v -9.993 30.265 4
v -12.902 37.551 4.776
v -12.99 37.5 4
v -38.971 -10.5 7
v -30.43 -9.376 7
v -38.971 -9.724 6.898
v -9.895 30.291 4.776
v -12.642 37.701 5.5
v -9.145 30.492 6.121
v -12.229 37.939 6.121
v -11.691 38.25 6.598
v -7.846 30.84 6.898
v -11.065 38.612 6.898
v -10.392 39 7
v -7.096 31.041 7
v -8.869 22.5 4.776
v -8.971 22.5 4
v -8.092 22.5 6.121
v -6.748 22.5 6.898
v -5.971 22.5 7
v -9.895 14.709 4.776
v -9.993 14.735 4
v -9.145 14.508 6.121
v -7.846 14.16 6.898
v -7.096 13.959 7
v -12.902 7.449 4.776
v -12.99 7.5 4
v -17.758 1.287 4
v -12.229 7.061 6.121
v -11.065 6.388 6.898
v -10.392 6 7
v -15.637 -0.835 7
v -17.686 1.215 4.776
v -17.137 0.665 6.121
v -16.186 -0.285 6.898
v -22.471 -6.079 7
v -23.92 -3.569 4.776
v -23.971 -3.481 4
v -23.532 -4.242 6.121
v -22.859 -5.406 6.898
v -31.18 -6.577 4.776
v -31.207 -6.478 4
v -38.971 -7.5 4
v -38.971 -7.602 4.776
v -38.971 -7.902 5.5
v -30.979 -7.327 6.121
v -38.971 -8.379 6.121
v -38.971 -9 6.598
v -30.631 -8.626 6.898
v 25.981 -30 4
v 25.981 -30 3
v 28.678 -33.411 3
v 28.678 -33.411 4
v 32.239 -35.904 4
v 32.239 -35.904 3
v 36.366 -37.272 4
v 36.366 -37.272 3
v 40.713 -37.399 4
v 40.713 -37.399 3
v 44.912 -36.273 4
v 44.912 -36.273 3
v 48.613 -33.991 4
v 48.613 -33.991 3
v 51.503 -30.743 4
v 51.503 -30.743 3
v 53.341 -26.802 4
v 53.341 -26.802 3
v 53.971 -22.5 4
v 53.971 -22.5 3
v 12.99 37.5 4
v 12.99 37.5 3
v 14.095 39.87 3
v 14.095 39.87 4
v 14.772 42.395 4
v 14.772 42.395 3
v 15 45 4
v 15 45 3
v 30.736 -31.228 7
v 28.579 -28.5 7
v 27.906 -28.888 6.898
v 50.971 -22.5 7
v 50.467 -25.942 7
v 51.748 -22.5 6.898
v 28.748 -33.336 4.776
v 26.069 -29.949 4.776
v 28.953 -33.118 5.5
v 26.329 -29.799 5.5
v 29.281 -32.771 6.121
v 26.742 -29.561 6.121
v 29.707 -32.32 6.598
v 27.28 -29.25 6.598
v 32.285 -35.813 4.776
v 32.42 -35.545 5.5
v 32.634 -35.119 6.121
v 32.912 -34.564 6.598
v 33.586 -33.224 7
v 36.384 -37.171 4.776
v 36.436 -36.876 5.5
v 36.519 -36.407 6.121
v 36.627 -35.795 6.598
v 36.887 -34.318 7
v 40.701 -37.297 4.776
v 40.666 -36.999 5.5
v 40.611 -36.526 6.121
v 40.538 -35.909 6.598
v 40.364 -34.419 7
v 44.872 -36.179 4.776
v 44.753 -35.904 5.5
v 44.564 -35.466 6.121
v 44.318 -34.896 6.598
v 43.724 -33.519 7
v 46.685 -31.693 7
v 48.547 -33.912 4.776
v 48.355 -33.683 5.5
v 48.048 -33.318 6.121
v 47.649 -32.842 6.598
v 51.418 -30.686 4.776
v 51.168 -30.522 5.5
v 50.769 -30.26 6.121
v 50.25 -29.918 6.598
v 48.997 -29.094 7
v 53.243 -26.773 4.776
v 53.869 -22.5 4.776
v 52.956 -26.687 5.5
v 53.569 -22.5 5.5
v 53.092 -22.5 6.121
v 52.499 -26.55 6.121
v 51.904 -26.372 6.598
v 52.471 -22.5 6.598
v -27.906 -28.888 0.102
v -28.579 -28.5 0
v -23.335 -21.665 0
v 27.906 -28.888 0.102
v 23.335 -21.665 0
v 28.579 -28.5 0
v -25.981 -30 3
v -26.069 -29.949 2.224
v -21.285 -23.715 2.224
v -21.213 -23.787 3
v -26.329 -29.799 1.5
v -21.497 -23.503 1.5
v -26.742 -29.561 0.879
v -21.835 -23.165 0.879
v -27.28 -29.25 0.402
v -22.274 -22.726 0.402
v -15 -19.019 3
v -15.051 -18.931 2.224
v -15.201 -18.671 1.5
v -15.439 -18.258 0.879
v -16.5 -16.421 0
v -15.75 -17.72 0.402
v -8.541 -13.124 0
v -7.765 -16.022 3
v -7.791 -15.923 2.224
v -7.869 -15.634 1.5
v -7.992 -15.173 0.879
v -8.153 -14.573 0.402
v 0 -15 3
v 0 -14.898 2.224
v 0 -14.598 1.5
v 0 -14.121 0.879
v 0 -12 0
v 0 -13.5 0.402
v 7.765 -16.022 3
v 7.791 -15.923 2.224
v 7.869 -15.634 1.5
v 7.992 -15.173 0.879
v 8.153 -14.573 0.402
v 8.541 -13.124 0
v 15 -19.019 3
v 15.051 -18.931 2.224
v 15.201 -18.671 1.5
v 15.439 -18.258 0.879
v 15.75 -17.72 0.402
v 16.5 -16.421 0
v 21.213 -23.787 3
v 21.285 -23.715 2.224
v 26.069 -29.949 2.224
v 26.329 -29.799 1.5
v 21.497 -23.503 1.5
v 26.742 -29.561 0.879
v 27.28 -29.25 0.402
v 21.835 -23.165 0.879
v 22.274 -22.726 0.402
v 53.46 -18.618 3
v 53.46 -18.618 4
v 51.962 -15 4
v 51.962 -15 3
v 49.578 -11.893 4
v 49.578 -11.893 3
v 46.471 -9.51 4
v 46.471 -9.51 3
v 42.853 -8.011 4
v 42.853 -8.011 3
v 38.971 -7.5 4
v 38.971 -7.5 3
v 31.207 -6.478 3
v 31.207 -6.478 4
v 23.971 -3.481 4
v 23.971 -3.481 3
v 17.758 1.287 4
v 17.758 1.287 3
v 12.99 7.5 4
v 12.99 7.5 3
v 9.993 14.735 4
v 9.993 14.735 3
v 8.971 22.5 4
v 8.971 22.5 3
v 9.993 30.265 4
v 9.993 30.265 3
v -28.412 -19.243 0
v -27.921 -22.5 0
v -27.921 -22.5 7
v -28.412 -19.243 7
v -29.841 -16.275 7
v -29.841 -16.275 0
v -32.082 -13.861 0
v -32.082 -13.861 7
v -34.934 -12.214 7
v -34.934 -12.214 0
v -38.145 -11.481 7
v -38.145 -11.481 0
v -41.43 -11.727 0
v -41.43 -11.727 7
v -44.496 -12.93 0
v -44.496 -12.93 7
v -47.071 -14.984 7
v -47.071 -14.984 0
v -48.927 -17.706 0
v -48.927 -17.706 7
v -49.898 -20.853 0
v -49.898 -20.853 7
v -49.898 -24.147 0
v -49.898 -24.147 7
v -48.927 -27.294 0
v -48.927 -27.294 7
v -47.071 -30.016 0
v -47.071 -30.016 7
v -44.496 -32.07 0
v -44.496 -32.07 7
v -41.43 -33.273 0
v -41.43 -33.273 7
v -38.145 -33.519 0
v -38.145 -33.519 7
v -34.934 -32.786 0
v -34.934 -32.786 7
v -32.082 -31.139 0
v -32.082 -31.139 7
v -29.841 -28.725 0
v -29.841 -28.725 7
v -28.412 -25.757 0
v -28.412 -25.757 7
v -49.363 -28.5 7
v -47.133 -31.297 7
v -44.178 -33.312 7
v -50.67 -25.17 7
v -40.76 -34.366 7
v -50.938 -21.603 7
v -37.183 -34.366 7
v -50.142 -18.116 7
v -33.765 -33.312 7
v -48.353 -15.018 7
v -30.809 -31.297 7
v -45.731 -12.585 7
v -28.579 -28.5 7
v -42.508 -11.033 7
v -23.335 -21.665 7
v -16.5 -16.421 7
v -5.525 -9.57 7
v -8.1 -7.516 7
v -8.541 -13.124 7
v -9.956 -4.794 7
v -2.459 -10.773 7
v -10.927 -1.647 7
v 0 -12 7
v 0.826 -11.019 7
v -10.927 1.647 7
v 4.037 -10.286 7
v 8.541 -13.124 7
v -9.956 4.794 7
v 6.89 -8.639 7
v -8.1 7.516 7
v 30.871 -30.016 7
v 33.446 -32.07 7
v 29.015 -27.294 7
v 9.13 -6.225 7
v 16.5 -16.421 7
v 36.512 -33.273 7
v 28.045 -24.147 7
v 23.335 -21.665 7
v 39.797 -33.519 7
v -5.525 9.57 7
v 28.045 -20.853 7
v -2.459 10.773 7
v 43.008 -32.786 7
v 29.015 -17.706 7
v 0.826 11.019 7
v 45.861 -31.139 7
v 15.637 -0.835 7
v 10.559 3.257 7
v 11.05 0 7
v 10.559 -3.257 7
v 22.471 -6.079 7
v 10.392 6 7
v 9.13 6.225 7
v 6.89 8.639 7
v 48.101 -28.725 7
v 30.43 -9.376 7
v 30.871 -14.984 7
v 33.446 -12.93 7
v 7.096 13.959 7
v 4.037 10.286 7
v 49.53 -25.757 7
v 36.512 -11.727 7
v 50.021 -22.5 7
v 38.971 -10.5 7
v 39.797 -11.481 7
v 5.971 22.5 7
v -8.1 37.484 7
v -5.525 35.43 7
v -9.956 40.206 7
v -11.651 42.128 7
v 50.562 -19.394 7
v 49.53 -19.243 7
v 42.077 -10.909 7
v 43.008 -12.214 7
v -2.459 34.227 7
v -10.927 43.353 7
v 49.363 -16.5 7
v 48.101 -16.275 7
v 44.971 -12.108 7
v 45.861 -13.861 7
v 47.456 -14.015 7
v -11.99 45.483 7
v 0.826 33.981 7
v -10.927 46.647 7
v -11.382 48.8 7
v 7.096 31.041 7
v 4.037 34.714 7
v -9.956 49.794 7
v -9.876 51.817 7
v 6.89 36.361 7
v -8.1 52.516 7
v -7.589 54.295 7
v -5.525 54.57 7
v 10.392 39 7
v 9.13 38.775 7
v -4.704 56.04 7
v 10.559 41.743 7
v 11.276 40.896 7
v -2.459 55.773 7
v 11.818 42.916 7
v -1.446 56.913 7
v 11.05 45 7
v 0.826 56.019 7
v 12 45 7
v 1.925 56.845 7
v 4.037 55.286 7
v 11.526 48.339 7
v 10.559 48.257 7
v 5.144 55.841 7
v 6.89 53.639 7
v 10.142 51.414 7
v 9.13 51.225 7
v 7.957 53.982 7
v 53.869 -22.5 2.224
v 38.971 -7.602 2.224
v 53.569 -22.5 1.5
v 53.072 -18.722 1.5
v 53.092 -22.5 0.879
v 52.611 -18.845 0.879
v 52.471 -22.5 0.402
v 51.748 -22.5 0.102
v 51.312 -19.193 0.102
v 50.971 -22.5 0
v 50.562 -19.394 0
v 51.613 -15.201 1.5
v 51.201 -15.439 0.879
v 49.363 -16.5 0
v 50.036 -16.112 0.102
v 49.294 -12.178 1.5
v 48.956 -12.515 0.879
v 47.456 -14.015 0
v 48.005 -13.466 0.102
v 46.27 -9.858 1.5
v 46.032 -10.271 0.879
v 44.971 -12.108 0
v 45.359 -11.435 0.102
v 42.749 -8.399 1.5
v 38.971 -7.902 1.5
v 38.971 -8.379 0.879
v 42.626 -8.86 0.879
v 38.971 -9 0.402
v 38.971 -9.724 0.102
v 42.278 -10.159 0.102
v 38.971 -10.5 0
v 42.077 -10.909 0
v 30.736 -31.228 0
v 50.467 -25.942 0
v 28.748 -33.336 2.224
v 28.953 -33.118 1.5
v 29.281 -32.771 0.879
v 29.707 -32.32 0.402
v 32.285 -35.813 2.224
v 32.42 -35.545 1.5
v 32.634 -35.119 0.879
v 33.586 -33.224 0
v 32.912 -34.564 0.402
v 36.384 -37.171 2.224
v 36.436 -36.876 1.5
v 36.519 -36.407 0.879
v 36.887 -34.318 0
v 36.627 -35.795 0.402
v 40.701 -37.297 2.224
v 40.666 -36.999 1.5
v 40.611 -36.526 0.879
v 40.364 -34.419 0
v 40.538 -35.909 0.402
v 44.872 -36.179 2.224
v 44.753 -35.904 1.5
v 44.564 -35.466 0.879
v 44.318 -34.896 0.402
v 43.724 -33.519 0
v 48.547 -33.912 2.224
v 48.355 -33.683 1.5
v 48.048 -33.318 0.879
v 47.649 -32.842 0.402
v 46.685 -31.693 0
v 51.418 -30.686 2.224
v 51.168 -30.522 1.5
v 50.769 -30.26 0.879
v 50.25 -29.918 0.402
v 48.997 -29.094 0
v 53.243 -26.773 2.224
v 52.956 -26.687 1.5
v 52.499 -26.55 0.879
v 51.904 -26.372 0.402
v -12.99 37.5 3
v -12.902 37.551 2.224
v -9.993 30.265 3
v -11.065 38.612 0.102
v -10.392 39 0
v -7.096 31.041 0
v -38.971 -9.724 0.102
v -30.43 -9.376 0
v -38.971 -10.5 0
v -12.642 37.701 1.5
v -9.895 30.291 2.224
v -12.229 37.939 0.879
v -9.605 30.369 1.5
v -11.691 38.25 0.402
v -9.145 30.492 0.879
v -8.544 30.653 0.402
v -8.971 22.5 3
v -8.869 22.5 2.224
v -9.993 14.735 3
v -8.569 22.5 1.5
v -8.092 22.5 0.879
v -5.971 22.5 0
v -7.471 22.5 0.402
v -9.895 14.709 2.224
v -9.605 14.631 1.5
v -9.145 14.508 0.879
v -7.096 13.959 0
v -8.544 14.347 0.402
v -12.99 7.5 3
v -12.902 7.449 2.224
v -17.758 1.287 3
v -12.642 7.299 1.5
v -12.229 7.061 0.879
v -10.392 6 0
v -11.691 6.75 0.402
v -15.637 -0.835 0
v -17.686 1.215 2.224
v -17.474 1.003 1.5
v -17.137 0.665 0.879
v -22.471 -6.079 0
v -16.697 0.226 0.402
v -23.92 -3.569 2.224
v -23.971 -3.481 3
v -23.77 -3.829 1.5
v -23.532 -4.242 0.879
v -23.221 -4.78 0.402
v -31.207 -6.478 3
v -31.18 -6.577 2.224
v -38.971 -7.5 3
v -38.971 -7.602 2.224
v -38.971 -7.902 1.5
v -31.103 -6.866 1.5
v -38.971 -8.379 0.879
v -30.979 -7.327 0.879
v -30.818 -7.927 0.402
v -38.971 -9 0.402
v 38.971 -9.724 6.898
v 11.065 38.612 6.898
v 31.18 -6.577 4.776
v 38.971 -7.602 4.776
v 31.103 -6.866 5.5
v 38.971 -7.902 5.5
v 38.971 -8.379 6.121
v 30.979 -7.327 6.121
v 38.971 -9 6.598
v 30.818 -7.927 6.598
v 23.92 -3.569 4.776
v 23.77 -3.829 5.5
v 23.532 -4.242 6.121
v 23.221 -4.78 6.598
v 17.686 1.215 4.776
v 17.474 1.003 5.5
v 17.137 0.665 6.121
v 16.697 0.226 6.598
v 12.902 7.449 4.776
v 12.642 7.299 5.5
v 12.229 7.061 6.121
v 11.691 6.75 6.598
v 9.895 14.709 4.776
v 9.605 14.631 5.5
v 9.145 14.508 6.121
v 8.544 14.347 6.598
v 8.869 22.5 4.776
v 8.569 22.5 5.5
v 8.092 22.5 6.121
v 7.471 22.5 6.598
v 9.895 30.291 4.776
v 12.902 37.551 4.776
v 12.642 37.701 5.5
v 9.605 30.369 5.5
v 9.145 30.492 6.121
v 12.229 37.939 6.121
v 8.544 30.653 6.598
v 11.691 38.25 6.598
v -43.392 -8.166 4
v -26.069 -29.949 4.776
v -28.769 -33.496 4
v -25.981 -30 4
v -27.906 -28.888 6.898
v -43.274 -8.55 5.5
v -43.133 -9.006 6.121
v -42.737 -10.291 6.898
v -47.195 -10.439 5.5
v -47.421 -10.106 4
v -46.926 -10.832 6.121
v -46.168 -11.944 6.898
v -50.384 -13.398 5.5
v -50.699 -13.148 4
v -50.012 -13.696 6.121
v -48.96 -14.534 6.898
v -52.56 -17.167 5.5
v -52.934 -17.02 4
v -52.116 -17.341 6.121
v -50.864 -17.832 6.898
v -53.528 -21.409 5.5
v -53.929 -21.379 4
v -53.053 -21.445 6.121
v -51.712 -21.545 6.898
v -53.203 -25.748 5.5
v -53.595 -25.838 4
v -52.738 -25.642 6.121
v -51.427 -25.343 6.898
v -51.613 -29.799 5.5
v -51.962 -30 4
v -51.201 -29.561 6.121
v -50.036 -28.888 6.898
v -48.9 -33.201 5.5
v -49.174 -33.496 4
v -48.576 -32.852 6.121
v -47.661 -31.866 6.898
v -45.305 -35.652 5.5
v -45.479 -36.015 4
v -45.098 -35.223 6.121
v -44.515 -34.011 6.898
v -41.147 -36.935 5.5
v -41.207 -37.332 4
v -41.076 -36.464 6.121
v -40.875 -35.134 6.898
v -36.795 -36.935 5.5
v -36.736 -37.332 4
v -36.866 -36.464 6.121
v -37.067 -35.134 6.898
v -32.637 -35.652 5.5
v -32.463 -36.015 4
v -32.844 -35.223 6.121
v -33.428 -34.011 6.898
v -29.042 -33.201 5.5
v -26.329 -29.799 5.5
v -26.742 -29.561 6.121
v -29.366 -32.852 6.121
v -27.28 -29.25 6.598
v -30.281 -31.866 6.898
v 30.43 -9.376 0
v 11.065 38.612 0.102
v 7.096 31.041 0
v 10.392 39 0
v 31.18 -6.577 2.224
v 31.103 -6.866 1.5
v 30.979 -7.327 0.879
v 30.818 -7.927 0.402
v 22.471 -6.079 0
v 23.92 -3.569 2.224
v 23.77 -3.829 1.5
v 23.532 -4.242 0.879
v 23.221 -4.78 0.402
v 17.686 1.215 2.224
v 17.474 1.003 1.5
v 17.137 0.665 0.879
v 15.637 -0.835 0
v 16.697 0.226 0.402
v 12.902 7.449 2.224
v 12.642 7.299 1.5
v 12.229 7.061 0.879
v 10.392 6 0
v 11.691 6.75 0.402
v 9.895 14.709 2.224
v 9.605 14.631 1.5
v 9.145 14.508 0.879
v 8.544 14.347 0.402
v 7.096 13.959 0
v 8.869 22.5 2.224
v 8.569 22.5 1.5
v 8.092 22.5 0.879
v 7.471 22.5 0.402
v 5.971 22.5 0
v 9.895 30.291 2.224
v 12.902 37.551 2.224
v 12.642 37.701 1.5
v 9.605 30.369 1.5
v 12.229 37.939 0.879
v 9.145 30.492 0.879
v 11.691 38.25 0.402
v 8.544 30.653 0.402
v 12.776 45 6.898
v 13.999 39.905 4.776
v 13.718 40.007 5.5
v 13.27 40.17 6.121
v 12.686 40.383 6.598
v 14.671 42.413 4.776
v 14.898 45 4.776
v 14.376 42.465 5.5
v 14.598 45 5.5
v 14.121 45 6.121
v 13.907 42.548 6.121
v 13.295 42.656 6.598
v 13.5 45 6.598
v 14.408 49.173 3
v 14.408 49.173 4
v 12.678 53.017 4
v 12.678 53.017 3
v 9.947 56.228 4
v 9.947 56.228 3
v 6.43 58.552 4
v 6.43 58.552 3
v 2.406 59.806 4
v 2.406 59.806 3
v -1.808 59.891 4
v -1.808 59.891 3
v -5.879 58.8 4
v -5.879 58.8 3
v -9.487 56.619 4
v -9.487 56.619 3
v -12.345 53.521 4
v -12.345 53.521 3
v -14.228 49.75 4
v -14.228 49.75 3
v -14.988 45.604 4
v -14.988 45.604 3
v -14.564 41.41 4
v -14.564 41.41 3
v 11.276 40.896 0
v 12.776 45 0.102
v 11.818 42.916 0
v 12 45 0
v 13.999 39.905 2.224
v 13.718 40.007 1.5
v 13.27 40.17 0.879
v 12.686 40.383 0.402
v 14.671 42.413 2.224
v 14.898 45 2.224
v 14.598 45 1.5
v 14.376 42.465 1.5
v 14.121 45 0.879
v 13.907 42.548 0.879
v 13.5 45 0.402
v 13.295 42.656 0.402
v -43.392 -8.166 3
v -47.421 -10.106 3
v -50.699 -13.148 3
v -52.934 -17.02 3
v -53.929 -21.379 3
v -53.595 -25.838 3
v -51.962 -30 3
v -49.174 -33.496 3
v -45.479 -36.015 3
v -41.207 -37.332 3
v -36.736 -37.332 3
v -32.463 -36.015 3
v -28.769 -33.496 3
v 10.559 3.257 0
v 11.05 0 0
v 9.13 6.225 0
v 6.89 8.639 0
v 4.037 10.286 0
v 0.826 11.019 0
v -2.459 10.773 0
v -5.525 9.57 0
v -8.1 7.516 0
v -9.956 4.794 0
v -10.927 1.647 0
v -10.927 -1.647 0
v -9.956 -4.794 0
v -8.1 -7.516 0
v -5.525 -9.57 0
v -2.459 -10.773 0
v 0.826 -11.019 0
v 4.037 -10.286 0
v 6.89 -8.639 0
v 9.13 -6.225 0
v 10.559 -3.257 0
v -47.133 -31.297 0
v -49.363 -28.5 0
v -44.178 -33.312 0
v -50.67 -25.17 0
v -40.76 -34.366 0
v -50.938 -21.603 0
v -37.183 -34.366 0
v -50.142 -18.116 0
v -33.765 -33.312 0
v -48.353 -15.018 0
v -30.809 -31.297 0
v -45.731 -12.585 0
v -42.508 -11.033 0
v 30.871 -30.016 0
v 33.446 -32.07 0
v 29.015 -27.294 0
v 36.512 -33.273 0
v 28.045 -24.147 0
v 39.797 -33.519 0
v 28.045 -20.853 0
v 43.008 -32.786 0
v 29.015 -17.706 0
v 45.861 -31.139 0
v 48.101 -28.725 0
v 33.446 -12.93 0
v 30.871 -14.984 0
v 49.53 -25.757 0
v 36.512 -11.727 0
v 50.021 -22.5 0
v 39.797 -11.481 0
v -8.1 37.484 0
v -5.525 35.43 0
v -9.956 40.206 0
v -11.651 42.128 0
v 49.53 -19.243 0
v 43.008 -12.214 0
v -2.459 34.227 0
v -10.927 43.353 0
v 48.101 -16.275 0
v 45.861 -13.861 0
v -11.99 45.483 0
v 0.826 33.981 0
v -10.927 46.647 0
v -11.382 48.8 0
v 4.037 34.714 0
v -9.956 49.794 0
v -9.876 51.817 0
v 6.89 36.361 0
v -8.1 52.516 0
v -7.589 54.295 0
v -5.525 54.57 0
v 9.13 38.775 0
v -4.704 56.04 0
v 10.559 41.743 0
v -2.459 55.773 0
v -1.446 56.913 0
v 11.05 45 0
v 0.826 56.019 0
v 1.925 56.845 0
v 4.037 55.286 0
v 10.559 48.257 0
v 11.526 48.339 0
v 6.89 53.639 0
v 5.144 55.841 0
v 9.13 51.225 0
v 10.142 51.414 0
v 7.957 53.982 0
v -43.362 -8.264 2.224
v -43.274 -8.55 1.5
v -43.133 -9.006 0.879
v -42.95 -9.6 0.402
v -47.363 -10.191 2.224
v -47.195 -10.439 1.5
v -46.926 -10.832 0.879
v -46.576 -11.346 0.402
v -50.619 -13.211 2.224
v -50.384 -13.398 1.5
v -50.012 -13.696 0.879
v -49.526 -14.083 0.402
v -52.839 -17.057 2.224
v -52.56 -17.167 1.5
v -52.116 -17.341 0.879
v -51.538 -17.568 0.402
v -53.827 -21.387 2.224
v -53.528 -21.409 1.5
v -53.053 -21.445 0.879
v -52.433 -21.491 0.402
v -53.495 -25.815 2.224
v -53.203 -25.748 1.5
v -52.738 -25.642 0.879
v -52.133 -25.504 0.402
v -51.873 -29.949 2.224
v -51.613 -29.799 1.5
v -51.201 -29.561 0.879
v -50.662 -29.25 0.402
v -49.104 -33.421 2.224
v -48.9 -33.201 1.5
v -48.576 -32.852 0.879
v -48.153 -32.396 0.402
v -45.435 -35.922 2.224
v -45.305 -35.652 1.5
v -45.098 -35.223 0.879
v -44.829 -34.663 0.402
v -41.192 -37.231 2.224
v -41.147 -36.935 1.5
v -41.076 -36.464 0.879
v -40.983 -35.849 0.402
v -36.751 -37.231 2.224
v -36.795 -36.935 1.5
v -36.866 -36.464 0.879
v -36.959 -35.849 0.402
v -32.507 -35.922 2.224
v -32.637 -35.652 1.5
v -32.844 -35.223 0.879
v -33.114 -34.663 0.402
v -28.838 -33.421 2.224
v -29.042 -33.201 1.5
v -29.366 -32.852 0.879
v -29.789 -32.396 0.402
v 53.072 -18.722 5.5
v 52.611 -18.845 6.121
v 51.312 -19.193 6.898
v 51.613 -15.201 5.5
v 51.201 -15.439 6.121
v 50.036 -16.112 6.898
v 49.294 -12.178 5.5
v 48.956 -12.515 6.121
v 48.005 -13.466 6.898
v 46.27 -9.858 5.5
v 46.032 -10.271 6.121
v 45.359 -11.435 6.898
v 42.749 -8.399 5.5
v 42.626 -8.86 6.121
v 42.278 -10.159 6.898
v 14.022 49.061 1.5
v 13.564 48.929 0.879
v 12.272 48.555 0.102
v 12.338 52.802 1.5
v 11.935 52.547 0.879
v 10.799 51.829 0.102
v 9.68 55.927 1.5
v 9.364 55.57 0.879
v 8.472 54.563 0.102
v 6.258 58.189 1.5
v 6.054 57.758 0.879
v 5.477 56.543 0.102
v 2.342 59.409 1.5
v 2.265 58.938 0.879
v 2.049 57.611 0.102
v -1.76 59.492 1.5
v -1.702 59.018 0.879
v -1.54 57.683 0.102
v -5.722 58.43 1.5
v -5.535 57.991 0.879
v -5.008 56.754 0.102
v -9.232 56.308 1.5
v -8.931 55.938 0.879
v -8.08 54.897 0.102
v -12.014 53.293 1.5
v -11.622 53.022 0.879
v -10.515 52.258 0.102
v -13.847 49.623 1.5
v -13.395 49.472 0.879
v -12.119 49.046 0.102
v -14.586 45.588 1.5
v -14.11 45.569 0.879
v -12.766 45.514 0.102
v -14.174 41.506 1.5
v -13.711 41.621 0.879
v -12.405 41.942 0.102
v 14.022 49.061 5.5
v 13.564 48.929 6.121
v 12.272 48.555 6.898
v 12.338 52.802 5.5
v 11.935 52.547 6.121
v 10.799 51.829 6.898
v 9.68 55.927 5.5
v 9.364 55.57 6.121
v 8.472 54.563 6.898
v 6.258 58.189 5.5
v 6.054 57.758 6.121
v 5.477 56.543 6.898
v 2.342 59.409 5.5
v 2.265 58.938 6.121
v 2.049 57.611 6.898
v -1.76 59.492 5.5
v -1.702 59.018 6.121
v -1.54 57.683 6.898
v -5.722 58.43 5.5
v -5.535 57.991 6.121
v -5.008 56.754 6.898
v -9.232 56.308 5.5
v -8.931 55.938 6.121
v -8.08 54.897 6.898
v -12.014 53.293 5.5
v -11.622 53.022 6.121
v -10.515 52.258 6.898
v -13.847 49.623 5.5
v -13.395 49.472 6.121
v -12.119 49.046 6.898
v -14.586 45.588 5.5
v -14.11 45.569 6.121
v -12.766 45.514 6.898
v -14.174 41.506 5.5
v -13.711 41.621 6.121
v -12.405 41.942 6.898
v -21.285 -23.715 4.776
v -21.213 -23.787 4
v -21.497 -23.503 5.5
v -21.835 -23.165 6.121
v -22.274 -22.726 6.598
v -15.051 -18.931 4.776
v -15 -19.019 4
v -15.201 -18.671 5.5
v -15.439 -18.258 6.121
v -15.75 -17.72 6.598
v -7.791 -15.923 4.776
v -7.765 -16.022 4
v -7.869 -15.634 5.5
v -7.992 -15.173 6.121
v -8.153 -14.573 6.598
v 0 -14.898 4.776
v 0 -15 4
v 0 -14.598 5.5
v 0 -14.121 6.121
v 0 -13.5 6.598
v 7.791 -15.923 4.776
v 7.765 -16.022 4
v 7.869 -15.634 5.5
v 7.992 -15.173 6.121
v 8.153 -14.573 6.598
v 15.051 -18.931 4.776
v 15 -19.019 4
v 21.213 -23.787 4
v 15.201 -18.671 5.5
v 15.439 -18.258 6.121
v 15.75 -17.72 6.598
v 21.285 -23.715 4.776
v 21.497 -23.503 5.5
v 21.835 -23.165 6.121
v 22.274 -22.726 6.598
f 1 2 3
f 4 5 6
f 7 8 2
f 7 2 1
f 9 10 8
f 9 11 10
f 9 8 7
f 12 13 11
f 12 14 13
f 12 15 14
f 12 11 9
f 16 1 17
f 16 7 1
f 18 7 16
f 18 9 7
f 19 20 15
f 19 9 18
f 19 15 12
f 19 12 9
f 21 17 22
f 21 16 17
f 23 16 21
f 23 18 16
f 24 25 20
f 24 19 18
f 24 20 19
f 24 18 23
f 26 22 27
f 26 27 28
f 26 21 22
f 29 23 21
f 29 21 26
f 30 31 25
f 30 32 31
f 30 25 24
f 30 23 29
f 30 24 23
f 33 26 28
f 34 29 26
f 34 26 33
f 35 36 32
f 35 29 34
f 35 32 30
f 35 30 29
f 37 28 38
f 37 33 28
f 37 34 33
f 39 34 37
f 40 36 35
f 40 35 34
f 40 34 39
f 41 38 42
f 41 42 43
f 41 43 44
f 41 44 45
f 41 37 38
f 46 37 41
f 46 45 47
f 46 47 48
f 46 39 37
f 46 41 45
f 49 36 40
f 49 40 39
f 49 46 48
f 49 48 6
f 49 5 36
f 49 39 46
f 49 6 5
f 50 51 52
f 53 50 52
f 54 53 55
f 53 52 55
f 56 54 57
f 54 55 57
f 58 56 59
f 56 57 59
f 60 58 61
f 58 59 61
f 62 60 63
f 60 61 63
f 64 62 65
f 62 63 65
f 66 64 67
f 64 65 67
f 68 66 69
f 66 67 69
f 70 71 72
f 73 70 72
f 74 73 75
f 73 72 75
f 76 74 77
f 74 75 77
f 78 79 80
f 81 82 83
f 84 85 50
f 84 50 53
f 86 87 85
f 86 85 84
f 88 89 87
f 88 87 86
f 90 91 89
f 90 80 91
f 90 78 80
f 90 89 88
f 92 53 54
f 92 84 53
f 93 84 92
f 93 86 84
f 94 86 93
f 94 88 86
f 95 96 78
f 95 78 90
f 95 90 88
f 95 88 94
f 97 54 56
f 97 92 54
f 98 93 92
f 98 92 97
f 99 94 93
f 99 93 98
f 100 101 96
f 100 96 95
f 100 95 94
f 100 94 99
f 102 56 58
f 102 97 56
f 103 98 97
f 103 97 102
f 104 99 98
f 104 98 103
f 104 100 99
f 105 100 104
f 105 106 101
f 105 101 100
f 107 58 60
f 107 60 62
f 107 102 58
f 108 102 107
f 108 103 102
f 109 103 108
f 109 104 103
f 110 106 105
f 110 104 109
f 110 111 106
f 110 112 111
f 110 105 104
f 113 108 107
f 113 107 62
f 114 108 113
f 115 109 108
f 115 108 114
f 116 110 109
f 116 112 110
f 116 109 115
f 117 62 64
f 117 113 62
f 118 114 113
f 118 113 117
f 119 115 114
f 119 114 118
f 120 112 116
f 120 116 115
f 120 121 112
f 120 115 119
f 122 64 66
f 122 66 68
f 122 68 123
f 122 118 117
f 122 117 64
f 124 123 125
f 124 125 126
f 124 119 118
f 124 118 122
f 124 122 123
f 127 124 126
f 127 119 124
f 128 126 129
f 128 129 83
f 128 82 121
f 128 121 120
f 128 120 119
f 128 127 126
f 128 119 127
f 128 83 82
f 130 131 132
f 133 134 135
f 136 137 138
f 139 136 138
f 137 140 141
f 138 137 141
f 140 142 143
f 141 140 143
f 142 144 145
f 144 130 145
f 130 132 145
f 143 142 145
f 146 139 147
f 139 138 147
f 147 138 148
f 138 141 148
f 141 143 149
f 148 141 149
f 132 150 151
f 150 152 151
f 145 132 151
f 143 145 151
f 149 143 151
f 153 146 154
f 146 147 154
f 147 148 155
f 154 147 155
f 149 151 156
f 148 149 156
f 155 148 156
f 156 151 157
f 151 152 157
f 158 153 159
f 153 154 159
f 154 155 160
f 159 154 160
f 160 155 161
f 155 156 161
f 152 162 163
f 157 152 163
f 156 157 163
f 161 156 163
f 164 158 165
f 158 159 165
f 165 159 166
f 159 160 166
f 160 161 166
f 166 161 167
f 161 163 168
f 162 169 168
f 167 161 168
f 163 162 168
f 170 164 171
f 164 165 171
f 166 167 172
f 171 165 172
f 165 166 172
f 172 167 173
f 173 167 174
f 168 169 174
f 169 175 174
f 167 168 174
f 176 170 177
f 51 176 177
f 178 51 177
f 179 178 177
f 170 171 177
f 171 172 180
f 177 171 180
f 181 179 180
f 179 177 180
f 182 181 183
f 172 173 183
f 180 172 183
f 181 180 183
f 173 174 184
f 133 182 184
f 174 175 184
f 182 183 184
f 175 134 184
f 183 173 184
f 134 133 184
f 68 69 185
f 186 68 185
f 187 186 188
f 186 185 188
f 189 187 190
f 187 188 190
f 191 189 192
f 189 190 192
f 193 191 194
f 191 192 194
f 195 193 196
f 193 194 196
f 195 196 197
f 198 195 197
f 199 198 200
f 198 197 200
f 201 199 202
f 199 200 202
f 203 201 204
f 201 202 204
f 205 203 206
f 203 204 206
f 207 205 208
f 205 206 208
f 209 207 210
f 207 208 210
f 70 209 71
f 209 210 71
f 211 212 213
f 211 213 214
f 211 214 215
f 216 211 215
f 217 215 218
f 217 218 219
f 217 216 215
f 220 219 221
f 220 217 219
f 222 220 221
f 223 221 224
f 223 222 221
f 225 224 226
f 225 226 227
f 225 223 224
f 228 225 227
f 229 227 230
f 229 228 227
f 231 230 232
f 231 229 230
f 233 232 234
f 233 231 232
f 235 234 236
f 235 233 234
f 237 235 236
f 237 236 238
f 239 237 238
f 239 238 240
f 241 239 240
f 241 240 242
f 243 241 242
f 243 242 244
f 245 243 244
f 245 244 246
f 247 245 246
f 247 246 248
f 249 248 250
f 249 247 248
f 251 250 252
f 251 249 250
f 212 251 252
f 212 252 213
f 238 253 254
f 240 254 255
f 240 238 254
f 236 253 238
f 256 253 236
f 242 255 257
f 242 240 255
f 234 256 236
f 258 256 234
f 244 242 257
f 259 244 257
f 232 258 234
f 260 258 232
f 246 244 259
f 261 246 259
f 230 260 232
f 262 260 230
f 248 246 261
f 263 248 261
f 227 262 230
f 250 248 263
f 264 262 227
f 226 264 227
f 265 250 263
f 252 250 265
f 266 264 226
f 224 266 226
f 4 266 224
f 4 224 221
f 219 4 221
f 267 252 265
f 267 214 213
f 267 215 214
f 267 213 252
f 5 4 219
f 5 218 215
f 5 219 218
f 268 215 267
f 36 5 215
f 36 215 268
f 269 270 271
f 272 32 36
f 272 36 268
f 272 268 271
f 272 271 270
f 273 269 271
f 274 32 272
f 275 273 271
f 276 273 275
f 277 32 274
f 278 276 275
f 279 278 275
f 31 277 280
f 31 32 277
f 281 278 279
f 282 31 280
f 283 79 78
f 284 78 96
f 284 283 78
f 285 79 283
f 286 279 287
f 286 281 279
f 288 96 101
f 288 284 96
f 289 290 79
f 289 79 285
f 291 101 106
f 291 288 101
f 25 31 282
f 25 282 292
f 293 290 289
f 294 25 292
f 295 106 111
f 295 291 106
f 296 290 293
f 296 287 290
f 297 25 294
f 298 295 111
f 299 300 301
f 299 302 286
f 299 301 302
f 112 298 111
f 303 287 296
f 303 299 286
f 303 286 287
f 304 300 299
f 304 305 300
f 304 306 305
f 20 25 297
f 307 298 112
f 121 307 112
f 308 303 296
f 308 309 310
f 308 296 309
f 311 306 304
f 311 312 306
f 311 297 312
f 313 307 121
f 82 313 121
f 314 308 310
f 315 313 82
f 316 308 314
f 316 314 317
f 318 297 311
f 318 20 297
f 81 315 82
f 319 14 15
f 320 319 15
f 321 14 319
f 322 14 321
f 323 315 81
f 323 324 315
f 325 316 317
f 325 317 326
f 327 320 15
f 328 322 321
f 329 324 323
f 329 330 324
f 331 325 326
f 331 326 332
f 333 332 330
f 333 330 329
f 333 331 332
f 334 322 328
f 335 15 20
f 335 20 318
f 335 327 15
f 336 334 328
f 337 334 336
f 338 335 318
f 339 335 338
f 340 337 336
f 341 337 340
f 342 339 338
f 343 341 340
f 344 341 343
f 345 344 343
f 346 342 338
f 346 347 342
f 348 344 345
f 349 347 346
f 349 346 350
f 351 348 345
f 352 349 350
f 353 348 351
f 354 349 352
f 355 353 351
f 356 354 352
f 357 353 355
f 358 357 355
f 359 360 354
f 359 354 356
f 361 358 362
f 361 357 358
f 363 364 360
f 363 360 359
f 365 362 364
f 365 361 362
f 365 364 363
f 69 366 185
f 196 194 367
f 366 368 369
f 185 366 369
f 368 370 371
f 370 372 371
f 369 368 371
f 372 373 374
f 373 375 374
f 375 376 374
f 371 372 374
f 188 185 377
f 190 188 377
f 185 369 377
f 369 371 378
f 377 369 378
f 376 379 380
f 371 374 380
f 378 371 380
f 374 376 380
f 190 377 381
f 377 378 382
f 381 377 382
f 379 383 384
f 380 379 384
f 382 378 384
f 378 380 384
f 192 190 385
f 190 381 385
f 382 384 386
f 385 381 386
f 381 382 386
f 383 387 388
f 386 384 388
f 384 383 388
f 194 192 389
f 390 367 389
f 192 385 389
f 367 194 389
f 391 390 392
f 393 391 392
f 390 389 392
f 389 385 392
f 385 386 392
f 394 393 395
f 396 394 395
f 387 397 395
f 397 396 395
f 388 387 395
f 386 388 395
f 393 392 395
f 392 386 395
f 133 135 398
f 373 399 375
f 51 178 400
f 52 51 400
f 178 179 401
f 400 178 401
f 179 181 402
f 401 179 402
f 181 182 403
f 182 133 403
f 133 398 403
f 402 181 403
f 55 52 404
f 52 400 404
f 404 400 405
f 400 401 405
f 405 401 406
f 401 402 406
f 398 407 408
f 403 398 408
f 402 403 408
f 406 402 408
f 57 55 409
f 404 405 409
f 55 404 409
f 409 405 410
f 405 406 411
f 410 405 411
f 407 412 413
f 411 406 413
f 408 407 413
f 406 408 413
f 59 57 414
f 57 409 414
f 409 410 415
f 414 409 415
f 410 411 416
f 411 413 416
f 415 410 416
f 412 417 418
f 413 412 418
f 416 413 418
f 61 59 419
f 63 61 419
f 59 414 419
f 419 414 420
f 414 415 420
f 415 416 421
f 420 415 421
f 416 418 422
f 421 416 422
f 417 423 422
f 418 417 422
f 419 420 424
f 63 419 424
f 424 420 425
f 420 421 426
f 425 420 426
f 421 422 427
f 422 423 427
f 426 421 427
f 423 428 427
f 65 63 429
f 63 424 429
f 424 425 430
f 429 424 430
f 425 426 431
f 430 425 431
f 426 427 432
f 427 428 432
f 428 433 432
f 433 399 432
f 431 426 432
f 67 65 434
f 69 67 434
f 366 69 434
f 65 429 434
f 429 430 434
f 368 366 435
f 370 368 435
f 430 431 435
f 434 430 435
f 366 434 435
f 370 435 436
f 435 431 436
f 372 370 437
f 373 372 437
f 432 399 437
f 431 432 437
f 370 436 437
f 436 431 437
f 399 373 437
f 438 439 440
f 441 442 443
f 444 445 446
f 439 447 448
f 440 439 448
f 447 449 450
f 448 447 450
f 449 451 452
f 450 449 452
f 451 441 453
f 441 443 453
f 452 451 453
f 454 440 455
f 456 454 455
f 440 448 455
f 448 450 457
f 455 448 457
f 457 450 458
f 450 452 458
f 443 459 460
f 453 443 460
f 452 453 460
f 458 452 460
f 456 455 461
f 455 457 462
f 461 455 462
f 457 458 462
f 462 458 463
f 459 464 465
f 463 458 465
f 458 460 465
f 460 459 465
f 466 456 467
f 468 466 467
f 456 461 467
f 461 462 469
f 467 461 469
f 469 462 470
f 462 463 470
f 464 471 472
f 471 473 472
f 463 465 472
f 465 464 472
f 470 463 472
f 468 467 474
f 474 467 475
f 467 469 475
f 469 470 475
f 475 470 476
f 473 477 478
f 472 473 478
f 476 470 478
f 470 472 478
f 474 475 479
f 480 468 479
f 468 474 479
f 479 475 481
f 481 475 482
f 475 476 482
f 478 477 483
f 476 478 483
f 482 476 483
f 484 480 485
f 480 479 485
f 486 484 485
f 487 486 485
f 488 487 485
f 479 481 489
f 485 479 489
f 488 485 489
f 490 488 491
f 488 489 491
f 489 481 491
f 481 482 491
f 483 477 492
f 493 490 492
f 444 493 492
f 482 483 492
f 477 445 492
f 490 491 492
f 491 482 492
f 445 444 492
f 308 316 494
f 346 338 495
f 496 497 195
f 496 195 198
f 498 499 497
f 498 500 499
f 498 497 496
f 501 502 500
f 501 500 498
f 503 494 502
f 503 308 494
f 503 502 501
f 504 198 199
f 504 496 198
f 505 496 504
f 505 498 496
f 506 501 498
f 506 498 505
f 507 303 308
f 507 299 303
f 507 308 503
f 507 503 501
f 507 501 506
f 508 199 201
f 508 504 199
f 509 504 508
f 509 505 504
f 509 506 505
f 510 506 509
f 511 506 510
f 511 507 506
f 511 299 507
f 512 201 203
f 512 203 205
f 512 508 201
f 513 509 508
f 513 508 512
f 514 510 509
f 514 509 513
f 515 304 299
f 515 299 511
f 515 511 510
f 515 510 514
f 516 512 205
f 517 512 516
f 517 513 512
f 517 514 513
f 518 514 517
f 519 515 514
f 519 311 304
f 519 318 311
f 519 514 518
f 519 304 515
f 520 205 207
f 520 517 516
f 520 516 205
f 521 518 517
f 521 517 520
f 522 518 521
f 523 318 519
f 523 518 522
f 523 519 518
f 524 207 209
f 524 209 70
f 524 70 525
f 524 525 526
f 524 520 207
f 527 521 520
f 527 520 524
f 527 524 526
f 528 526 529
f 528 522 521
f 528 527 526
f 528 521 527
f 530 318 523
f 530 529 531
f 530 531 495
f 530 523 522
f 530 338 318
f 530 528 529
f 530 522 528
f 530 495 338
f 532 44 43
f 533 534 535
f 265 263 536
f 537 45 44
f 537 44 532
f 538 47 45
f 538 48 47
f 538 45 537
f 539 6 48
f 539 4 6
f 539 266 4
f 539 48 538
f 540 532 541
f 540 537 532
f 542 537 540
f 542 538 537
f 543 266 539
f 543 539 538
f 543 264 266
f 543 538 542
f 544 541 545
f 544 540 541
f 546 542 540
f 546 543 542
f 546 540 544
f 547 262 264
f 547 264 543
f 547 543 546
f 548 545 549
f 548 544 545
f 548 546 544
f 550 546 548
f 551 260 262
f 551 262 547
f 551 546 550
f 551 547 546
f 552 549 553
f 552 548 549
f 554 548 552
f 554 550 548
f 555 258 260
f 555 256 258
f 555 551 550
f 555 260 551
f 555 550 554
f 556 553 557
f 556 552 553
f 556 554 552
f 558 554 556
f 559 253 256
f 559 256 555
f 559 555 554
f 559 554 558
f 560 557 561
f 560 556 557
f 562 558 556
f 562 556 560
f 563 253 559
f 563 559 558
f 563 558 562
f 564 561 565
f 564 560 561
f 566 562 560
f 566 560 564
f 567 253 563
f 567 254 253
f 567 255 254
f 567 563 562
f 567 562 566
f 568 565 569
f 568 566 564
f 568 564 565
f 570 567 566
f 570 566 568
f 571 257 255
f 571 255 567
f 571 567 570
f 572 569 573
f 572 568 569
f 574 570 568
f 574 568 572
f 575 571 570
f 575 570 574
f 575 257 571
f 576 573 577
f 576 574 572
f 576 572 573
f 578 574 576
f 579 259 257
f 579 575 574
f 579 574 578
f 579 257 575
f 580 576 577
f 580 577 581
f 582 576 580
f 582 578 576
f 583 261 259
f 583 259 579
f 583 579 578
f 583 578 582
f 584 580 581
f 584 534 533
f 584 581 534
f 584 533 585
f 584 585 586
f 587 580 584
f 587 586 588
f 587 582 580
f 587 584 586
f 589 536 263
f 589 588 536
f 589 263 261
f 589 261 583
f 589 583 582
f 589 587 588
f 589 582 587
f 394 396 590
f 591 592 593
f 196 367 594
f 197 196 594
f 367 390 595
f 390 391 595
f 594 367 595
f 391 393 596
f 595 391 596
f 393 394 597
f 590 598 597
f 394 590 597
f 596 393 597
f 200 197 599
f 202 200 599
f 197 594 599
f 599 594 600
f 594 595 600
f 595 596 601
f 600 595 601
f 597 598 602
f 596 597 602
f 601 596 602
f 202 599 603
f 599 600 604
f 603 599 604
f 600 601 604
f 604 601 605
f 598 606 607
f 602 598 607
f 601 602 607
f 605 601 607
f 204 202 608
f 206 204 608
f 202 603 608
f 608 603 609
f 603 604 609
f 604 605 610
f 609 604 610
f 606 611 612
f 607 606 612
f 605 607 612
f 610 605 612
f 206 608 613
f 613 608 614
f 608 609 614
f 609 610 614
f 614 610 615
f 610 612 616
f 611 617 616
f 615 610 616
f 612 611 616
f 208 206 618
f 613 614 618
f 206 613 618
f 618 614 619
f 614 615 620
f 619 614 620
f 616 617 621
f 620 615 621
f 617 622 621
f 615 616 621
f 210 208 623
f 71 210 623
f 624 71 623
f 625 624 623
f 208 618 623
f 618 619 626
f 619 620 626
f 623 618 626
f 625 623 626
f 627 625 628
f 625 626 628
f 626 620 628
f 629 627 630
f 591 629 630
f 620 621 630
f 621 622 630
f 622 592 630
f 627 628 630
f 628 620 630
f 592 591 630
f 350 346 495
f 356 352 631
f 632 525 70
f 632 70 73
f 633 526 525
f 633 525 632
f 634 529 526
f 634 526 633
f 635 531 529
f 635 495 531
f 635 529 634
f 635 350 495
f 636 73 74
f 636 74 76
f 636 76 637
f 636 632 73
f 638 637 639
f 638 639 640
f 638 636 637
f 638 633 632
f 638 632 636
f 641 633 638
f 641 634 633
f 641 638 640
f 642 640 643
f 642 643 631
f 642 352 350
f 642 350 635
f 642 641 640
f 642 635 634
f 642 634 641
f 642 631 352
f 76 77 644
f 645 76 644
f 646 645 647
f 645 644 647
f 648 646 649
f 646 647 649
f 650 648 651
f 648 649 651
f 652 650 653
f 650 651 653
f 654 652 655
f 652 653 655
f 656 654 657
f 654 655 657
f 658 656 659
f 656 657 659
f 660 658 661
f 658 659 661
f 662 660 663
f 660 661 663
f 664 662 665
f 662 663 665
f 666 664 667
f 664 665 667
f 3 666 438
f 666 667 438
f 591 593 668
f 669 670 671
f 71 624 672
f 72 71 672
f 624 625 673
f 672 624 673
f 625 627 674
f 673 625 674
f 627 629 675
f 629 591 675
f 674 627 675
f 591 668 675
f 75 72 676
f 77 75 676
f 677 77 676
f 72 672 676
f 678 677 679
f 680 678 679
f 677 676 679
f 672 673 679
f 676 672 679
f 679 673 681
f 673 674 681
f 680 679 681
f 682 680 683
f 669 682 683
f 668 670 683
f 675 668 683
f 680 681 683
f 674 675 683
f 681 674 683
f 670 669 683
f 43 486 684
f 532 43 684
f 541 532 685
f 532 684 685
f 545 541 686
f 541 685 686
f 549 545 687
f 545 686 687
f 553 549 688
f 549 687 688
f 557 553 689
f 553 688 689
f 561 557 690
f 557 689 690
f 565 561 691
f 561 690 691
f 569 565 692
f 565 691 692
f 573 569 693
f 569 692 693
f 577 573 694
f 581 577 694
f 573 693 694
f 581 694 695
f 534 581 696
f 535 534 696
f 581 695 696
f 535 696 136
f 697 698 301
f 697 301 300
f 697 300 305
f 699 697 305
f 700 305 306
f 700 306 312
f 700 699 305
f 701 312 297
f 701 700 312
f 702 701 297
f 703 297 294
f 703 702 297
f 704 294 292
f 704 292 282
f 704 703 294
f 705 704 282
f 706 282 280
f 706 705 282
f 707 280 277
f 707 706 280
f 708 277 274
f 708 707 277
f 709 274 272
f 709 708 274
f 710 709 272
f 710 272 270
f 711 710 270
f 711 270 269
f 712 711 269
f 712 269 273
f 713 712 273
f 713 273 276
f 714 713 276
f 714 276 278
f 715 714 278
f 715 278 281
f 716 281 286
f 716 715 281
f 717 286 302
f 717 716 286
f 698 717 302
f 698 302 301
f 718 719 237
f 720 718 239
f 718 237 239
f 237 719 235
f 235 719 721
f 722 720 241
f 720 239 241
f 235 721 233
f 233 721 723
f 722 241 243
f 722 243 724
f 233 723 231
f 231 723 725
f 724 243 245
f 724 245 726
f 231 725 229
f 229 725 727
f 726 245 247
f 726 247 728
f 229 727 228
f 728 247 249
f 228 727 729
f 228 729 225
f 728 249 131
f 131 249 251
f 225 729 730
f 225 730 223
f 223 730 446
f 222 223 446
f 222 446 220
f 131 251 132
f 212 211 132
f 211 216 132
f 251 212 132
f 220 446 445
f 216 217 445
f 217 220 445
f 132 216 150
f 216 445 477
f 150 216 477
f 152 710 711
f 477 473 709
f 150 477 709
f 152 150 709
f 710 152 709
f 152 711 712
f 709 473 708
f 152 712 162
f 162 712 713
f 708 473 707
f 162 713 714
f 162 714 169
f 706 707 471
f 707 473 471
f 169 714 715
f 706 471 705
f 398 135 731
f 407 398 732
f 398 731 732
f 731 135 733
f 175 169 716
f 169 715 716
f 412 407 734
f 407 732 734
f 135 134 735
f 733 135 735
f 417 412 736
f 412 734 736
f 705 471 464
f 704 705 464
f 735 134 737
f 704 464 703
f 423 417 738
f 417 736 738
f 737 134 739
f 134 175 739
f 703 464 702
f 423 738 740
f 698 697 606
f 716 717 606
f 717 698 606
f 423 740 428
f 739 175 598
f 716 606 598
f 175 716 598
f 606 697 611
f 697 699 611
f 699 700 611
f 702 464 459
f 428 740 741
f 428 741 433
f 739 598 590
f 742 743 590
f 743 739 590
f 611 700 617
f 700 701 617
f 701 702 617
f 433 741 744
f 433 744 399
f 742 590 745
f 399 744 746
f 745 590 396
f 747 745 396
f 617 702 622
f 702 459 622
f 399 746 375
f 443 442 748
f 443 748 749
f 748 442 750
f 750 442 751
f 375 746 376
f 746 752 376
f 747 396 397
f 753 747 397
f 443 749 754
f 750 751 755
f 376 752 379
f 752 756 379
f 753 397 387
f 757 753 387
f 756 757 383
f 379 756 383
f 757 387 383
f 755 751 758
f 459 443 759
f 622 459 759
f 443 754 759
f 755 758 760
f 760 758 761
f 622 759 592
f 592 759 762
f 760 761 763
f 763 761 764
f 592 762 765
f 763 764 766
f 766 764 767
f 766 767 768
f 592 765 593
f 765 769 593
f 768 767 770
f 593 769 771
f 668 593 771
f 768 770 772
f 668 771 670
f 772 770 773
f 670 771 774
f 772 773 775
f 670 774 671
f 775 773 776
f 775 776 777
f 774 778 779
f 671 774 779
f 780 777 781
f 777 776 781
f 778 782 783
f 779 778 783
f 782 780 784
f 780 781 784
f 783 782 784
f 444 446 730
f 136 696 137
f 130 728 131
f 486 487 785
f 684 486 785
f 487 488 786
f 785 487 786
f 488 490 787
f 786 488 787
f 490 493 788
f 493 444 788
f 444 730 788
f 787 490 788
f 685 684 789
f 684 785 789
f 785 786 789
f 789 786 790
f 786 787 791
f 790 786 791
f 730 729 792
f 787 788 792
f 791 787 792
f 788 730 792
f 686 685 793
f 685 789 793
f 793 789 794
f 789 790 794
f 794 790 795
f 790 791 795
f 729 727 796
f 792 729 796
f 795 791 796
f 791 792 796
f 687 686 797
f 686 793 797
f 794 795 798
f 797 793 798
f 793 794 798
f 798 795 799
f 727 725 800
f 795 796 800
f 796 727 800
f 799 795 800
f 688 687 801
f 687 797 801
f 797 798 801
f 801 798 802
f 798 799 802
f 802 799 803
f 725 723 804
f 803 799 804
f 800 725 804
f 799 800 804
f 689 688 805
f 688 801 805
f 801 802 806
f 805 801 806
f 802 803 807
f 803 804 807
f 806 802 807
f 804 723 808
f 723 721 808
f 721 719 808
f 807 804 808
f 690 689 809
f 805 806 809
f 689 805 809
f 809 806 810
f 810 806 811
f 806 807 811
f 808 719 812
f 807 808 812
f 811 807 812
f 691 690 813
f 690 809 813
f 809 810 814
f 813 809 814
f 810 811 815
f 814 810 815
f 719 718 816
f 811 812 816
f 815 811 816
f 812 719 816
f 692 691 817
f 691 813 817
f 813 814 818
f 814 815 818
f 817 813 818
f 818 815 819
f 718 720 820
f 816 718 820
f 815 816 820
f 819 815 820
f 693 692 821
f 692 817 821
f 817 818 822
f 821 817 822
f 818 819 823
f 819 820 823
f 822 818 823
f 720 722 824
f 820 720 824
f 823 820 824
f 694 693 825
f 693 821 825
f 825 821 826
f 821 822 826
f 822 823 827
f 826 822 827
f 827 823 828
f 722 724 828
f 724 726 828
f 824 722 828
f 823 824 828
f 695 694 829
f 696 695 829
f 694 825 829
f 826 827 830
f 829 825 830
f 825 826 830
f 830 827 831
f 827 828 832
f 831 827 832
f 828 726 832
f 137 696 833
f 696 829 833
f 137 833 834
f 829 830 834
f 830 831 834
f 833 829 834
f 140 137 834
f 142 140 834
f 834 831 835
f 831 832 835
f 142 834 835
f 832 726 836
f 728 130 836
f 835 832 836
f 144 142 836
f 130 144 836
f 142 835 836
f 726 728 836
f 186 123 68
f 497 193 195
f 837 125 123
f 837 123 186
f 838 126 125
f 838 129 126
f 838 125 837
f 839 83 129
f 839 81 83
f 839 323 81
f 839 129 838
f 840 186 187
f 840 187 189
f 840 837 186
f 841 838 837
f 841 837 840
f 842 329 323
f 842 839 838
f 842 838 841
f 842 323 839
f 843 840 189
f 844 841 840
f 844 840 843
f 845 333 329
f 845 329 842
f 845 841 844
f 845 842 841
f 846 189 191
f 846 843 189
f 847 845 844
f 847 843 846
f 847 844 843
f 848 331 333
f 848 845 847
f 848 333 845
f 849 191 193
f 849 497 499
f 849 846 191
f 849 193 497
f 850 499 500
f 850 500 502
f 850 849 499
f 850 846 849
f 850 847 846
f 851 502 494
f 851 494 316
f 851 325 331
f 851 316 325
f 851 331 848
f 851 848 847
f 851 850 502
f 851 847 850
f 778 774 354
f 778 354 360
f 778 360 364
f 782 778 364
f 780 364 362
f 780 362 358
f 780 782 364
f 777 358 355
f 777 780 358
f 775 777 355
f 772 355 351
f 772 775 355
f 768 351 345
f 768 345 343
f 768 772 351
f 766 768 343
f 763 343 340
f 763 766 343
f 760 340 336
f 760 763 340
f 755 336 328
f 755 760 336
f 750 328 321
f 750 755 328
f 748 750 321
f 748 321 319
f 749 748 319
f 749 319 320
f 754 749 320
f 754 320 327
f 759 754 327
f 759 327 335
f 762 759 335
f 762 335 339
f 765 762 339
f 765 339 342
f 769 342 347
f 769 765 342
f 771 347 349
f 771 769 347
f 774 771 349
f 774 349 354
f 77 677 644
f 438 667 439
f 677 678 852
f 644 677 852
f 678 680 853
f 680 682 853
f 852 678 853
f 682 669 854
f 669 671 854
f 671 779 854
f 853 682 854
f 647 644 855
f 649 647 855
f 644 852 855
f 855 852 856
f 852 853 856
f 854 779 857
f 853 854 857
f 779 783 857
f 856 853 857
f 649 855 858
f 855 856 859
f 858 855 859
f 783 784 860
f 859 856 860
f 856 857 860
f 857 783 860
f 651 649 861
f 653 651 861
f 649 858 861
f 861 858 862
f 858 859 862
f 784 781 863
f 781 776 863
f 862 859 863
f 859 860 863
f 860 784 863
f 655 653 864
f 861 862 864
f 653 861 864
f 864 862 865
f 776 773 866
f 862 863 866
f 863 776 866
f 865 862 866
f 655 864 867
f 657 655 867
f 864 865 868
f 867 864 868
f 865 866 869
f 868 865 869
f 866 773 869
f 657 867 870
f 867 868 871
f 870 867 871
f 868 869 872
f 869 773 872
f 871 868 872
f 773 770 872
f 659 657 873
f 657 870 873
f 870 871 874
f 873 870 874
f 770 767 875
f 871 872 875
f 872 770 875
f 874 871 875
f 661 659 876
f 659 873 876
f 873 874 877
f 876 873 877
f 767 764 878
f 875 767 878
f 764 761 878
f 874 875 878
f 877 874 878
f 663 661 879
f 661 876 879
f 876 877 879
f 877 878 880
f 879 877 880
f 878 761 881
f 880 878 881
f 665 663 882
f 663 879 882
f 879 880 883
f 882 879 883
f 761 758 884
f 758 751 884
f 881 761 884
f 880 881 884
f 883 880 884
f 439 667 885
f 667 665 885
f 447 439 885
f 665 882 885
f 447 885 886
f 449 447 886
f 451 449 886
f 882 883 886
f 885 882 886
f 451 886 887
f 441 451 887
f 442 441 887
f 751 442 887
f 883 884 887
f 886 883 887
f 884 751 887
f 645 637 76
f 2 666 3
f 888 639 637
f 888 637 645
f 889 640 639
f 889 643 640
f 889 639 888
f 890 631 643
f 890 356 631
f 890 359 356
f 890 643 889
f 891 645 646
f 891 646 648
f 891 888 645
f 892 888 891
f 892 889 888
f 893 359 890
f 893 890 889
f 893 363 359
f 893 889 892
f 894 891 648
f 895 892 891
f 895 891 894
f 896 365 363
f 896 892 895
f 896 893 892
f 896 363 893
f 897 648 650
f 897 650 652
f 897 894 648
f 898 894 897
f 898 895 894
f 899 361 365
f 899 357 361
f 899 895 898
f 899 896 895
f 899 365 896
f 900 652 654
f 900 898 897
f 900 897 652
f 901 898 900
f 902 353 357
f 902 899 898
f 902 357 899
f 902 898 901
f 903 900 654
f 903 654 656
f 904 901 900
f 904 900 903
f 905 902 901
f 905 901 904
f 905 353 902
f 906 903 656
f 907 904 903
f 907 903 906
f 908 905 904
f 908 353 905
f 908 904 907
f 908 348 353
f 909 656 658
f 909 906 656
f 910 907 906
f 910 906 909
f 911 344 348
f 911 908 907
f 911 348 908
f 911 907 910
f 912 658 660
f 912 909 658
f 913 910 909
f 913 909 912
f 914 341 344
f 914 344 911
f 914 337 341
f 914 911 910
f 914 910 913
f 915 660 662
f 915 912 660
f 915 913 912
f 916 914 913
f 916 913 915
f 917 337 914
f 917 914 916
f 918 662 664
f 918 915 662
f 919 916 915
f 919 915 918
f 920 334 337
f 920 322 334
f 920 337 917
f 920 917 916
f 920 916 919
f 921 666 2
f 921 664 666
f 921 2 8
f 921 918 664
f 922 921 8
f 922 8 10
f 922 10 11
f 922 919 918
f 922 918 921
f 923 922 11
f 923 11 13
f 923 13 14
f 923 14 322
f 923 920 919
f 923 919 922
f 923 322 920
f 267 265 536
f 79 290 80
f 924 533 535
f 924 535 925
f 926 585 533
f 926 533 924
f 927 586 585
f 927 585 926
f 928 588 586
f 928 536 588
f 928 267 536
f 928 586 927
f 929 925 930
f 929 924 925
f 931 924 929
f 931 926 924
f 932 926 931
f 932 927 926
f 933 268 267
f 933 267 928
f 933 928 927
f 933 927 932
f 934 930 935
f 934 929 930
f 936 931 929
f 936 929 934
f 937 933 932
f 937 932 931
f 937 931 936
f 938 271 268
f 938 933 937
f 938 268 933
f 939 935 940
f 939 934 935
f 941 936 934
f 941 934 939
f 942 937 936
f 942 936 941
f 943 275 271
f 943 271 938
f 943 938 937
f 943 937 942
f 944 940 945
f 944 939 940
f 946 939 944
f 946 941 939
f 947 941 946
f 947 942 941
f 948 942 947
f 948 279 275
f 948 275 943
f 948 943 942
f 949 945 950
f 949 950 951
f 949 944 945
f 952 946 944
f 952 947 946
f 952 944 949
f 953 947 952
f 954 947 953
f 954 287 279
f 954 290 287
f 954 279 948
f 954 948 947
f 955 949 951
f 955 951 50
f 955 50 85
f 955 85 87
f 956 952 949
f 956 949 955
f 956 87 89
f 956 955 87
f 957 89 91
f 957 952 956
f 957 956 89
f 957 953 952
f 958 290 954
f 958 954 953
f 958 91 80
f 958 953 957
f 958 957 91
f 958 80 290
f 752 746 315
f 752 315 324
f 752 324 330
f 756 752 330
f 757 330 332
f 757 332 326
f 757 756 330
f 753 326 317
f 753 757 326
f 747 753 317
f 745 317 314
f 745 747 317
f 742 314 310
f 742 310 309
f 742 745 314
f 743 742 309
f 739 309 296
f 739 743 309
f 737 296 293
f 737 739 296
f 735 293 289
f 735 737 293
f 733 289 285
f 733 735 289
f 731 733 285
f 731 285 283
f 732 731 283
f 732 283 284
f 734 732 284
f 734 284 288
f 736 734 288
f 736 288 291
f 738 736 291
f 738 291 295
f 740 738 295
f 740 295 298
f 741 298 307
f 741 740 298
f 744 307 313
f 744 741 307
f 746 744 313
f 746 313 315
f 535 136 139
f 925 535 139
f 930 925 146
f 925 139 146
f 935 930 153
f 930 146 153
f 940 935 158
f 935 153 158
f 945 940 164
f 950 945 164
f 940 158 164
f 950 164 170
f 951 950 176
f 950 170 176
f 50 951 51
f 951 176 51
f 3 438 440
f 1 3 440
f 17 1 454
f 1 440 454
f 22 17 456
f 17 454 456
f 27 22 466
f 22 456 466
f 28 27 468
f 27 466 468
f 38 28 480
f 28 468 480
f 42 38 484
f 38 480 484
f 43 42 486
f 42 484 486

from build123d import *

# Parameters (mm, degrees)
F0_R     = 11.05
F1_DEPTH = 7
F2_R     = 3


with BuildPart() as f1:
    # F0 (on Top) → F1 (new body)
    with BuildSketch(Plane.XY):
        with BuildLine():
            ThreePointArc((-23.971143, -22.5), (-28.364541, -11.893398), (-38.971143, -7.5))
            ThreePointArc((-38.971143, -7.5), (-51.961524, -30), (-25.980762, -30))
            ThreePointArc((-25.980762, -30), (-24.482256, -26.382286), (-23.971143, -22.5))
        make_face()
        with Locations((-38.971143, -22.5)):
            Circle(F0_R, mode=Mode.SUBTRACT)
        with BuildLine():
            ThreePointArc((12.990381, 37.5), (0, 30), (-12.990381, 37.5))
            ThreePointArc((-12.990381, 37.5), (-12.990381, 7.5), (-38.971143, -7.5))
            ThreePointArc((-38.971143, -7.5), (-28.364541, -11.893398), (-23.971143, -22.5))
            ThreePointArc((-23.971143, -22.5), (-24.482256, -26.382286), (-25.980762, -30))
            ThreePointArc((-25.980762, -30), (0, -15), (25.980762, -30))
            ThreePointArc((25.980762, -30), (25.980762, -15), (38.971143, -7.5))
            ThreePointArc((38.971143, -7.5), (12.990381, 7.5), (12.990381, 37.5))
        make_face()
        Circle(F0_R, mode=Mode.SUBTRACT)
        with BuildLine():
            ThreePointArc((12.990381, 37.5), (14.488887, 41.117714), (15, 45))
            ThreePointArc((15, 45), (-3.882286, 59.488887), (-12.990381, 37.5))
            ThreePointArc((-12.990381, 37.5), (0, 30), (12.990381, 37.5))
        make_face()
        with Locations((0, 45)):
            Circle(F0_R, mode=Mode.SUBTRACT)
        with BuildLine():
            ThreePointArc((53.971143, -22.5), (49.577745, -11.893398), (38.971143, -7.5))
            ThreePointArc((38.971143, -7.5), (25.980762, -15), (25.980762, -30))
            ThreePointArc((25.980762, -30), (42.853429, -36.988887), (53.971143, -22.5))
        make_face()
        with Locations((38.971143, -22.5)):
            Circle(F0_R, mode=Mode.SUBTRACT)
    extrude(amount=F1_DEPTH)

    # F2
    f2_edges = [f1.edges().sort_by_distance(p)[0] for p in [
        (-51.961524, -30, 7),
        (0, -15, 0),
    ]]
    fillet(f2_edges, radius=F2_R)


solid = f1.part
